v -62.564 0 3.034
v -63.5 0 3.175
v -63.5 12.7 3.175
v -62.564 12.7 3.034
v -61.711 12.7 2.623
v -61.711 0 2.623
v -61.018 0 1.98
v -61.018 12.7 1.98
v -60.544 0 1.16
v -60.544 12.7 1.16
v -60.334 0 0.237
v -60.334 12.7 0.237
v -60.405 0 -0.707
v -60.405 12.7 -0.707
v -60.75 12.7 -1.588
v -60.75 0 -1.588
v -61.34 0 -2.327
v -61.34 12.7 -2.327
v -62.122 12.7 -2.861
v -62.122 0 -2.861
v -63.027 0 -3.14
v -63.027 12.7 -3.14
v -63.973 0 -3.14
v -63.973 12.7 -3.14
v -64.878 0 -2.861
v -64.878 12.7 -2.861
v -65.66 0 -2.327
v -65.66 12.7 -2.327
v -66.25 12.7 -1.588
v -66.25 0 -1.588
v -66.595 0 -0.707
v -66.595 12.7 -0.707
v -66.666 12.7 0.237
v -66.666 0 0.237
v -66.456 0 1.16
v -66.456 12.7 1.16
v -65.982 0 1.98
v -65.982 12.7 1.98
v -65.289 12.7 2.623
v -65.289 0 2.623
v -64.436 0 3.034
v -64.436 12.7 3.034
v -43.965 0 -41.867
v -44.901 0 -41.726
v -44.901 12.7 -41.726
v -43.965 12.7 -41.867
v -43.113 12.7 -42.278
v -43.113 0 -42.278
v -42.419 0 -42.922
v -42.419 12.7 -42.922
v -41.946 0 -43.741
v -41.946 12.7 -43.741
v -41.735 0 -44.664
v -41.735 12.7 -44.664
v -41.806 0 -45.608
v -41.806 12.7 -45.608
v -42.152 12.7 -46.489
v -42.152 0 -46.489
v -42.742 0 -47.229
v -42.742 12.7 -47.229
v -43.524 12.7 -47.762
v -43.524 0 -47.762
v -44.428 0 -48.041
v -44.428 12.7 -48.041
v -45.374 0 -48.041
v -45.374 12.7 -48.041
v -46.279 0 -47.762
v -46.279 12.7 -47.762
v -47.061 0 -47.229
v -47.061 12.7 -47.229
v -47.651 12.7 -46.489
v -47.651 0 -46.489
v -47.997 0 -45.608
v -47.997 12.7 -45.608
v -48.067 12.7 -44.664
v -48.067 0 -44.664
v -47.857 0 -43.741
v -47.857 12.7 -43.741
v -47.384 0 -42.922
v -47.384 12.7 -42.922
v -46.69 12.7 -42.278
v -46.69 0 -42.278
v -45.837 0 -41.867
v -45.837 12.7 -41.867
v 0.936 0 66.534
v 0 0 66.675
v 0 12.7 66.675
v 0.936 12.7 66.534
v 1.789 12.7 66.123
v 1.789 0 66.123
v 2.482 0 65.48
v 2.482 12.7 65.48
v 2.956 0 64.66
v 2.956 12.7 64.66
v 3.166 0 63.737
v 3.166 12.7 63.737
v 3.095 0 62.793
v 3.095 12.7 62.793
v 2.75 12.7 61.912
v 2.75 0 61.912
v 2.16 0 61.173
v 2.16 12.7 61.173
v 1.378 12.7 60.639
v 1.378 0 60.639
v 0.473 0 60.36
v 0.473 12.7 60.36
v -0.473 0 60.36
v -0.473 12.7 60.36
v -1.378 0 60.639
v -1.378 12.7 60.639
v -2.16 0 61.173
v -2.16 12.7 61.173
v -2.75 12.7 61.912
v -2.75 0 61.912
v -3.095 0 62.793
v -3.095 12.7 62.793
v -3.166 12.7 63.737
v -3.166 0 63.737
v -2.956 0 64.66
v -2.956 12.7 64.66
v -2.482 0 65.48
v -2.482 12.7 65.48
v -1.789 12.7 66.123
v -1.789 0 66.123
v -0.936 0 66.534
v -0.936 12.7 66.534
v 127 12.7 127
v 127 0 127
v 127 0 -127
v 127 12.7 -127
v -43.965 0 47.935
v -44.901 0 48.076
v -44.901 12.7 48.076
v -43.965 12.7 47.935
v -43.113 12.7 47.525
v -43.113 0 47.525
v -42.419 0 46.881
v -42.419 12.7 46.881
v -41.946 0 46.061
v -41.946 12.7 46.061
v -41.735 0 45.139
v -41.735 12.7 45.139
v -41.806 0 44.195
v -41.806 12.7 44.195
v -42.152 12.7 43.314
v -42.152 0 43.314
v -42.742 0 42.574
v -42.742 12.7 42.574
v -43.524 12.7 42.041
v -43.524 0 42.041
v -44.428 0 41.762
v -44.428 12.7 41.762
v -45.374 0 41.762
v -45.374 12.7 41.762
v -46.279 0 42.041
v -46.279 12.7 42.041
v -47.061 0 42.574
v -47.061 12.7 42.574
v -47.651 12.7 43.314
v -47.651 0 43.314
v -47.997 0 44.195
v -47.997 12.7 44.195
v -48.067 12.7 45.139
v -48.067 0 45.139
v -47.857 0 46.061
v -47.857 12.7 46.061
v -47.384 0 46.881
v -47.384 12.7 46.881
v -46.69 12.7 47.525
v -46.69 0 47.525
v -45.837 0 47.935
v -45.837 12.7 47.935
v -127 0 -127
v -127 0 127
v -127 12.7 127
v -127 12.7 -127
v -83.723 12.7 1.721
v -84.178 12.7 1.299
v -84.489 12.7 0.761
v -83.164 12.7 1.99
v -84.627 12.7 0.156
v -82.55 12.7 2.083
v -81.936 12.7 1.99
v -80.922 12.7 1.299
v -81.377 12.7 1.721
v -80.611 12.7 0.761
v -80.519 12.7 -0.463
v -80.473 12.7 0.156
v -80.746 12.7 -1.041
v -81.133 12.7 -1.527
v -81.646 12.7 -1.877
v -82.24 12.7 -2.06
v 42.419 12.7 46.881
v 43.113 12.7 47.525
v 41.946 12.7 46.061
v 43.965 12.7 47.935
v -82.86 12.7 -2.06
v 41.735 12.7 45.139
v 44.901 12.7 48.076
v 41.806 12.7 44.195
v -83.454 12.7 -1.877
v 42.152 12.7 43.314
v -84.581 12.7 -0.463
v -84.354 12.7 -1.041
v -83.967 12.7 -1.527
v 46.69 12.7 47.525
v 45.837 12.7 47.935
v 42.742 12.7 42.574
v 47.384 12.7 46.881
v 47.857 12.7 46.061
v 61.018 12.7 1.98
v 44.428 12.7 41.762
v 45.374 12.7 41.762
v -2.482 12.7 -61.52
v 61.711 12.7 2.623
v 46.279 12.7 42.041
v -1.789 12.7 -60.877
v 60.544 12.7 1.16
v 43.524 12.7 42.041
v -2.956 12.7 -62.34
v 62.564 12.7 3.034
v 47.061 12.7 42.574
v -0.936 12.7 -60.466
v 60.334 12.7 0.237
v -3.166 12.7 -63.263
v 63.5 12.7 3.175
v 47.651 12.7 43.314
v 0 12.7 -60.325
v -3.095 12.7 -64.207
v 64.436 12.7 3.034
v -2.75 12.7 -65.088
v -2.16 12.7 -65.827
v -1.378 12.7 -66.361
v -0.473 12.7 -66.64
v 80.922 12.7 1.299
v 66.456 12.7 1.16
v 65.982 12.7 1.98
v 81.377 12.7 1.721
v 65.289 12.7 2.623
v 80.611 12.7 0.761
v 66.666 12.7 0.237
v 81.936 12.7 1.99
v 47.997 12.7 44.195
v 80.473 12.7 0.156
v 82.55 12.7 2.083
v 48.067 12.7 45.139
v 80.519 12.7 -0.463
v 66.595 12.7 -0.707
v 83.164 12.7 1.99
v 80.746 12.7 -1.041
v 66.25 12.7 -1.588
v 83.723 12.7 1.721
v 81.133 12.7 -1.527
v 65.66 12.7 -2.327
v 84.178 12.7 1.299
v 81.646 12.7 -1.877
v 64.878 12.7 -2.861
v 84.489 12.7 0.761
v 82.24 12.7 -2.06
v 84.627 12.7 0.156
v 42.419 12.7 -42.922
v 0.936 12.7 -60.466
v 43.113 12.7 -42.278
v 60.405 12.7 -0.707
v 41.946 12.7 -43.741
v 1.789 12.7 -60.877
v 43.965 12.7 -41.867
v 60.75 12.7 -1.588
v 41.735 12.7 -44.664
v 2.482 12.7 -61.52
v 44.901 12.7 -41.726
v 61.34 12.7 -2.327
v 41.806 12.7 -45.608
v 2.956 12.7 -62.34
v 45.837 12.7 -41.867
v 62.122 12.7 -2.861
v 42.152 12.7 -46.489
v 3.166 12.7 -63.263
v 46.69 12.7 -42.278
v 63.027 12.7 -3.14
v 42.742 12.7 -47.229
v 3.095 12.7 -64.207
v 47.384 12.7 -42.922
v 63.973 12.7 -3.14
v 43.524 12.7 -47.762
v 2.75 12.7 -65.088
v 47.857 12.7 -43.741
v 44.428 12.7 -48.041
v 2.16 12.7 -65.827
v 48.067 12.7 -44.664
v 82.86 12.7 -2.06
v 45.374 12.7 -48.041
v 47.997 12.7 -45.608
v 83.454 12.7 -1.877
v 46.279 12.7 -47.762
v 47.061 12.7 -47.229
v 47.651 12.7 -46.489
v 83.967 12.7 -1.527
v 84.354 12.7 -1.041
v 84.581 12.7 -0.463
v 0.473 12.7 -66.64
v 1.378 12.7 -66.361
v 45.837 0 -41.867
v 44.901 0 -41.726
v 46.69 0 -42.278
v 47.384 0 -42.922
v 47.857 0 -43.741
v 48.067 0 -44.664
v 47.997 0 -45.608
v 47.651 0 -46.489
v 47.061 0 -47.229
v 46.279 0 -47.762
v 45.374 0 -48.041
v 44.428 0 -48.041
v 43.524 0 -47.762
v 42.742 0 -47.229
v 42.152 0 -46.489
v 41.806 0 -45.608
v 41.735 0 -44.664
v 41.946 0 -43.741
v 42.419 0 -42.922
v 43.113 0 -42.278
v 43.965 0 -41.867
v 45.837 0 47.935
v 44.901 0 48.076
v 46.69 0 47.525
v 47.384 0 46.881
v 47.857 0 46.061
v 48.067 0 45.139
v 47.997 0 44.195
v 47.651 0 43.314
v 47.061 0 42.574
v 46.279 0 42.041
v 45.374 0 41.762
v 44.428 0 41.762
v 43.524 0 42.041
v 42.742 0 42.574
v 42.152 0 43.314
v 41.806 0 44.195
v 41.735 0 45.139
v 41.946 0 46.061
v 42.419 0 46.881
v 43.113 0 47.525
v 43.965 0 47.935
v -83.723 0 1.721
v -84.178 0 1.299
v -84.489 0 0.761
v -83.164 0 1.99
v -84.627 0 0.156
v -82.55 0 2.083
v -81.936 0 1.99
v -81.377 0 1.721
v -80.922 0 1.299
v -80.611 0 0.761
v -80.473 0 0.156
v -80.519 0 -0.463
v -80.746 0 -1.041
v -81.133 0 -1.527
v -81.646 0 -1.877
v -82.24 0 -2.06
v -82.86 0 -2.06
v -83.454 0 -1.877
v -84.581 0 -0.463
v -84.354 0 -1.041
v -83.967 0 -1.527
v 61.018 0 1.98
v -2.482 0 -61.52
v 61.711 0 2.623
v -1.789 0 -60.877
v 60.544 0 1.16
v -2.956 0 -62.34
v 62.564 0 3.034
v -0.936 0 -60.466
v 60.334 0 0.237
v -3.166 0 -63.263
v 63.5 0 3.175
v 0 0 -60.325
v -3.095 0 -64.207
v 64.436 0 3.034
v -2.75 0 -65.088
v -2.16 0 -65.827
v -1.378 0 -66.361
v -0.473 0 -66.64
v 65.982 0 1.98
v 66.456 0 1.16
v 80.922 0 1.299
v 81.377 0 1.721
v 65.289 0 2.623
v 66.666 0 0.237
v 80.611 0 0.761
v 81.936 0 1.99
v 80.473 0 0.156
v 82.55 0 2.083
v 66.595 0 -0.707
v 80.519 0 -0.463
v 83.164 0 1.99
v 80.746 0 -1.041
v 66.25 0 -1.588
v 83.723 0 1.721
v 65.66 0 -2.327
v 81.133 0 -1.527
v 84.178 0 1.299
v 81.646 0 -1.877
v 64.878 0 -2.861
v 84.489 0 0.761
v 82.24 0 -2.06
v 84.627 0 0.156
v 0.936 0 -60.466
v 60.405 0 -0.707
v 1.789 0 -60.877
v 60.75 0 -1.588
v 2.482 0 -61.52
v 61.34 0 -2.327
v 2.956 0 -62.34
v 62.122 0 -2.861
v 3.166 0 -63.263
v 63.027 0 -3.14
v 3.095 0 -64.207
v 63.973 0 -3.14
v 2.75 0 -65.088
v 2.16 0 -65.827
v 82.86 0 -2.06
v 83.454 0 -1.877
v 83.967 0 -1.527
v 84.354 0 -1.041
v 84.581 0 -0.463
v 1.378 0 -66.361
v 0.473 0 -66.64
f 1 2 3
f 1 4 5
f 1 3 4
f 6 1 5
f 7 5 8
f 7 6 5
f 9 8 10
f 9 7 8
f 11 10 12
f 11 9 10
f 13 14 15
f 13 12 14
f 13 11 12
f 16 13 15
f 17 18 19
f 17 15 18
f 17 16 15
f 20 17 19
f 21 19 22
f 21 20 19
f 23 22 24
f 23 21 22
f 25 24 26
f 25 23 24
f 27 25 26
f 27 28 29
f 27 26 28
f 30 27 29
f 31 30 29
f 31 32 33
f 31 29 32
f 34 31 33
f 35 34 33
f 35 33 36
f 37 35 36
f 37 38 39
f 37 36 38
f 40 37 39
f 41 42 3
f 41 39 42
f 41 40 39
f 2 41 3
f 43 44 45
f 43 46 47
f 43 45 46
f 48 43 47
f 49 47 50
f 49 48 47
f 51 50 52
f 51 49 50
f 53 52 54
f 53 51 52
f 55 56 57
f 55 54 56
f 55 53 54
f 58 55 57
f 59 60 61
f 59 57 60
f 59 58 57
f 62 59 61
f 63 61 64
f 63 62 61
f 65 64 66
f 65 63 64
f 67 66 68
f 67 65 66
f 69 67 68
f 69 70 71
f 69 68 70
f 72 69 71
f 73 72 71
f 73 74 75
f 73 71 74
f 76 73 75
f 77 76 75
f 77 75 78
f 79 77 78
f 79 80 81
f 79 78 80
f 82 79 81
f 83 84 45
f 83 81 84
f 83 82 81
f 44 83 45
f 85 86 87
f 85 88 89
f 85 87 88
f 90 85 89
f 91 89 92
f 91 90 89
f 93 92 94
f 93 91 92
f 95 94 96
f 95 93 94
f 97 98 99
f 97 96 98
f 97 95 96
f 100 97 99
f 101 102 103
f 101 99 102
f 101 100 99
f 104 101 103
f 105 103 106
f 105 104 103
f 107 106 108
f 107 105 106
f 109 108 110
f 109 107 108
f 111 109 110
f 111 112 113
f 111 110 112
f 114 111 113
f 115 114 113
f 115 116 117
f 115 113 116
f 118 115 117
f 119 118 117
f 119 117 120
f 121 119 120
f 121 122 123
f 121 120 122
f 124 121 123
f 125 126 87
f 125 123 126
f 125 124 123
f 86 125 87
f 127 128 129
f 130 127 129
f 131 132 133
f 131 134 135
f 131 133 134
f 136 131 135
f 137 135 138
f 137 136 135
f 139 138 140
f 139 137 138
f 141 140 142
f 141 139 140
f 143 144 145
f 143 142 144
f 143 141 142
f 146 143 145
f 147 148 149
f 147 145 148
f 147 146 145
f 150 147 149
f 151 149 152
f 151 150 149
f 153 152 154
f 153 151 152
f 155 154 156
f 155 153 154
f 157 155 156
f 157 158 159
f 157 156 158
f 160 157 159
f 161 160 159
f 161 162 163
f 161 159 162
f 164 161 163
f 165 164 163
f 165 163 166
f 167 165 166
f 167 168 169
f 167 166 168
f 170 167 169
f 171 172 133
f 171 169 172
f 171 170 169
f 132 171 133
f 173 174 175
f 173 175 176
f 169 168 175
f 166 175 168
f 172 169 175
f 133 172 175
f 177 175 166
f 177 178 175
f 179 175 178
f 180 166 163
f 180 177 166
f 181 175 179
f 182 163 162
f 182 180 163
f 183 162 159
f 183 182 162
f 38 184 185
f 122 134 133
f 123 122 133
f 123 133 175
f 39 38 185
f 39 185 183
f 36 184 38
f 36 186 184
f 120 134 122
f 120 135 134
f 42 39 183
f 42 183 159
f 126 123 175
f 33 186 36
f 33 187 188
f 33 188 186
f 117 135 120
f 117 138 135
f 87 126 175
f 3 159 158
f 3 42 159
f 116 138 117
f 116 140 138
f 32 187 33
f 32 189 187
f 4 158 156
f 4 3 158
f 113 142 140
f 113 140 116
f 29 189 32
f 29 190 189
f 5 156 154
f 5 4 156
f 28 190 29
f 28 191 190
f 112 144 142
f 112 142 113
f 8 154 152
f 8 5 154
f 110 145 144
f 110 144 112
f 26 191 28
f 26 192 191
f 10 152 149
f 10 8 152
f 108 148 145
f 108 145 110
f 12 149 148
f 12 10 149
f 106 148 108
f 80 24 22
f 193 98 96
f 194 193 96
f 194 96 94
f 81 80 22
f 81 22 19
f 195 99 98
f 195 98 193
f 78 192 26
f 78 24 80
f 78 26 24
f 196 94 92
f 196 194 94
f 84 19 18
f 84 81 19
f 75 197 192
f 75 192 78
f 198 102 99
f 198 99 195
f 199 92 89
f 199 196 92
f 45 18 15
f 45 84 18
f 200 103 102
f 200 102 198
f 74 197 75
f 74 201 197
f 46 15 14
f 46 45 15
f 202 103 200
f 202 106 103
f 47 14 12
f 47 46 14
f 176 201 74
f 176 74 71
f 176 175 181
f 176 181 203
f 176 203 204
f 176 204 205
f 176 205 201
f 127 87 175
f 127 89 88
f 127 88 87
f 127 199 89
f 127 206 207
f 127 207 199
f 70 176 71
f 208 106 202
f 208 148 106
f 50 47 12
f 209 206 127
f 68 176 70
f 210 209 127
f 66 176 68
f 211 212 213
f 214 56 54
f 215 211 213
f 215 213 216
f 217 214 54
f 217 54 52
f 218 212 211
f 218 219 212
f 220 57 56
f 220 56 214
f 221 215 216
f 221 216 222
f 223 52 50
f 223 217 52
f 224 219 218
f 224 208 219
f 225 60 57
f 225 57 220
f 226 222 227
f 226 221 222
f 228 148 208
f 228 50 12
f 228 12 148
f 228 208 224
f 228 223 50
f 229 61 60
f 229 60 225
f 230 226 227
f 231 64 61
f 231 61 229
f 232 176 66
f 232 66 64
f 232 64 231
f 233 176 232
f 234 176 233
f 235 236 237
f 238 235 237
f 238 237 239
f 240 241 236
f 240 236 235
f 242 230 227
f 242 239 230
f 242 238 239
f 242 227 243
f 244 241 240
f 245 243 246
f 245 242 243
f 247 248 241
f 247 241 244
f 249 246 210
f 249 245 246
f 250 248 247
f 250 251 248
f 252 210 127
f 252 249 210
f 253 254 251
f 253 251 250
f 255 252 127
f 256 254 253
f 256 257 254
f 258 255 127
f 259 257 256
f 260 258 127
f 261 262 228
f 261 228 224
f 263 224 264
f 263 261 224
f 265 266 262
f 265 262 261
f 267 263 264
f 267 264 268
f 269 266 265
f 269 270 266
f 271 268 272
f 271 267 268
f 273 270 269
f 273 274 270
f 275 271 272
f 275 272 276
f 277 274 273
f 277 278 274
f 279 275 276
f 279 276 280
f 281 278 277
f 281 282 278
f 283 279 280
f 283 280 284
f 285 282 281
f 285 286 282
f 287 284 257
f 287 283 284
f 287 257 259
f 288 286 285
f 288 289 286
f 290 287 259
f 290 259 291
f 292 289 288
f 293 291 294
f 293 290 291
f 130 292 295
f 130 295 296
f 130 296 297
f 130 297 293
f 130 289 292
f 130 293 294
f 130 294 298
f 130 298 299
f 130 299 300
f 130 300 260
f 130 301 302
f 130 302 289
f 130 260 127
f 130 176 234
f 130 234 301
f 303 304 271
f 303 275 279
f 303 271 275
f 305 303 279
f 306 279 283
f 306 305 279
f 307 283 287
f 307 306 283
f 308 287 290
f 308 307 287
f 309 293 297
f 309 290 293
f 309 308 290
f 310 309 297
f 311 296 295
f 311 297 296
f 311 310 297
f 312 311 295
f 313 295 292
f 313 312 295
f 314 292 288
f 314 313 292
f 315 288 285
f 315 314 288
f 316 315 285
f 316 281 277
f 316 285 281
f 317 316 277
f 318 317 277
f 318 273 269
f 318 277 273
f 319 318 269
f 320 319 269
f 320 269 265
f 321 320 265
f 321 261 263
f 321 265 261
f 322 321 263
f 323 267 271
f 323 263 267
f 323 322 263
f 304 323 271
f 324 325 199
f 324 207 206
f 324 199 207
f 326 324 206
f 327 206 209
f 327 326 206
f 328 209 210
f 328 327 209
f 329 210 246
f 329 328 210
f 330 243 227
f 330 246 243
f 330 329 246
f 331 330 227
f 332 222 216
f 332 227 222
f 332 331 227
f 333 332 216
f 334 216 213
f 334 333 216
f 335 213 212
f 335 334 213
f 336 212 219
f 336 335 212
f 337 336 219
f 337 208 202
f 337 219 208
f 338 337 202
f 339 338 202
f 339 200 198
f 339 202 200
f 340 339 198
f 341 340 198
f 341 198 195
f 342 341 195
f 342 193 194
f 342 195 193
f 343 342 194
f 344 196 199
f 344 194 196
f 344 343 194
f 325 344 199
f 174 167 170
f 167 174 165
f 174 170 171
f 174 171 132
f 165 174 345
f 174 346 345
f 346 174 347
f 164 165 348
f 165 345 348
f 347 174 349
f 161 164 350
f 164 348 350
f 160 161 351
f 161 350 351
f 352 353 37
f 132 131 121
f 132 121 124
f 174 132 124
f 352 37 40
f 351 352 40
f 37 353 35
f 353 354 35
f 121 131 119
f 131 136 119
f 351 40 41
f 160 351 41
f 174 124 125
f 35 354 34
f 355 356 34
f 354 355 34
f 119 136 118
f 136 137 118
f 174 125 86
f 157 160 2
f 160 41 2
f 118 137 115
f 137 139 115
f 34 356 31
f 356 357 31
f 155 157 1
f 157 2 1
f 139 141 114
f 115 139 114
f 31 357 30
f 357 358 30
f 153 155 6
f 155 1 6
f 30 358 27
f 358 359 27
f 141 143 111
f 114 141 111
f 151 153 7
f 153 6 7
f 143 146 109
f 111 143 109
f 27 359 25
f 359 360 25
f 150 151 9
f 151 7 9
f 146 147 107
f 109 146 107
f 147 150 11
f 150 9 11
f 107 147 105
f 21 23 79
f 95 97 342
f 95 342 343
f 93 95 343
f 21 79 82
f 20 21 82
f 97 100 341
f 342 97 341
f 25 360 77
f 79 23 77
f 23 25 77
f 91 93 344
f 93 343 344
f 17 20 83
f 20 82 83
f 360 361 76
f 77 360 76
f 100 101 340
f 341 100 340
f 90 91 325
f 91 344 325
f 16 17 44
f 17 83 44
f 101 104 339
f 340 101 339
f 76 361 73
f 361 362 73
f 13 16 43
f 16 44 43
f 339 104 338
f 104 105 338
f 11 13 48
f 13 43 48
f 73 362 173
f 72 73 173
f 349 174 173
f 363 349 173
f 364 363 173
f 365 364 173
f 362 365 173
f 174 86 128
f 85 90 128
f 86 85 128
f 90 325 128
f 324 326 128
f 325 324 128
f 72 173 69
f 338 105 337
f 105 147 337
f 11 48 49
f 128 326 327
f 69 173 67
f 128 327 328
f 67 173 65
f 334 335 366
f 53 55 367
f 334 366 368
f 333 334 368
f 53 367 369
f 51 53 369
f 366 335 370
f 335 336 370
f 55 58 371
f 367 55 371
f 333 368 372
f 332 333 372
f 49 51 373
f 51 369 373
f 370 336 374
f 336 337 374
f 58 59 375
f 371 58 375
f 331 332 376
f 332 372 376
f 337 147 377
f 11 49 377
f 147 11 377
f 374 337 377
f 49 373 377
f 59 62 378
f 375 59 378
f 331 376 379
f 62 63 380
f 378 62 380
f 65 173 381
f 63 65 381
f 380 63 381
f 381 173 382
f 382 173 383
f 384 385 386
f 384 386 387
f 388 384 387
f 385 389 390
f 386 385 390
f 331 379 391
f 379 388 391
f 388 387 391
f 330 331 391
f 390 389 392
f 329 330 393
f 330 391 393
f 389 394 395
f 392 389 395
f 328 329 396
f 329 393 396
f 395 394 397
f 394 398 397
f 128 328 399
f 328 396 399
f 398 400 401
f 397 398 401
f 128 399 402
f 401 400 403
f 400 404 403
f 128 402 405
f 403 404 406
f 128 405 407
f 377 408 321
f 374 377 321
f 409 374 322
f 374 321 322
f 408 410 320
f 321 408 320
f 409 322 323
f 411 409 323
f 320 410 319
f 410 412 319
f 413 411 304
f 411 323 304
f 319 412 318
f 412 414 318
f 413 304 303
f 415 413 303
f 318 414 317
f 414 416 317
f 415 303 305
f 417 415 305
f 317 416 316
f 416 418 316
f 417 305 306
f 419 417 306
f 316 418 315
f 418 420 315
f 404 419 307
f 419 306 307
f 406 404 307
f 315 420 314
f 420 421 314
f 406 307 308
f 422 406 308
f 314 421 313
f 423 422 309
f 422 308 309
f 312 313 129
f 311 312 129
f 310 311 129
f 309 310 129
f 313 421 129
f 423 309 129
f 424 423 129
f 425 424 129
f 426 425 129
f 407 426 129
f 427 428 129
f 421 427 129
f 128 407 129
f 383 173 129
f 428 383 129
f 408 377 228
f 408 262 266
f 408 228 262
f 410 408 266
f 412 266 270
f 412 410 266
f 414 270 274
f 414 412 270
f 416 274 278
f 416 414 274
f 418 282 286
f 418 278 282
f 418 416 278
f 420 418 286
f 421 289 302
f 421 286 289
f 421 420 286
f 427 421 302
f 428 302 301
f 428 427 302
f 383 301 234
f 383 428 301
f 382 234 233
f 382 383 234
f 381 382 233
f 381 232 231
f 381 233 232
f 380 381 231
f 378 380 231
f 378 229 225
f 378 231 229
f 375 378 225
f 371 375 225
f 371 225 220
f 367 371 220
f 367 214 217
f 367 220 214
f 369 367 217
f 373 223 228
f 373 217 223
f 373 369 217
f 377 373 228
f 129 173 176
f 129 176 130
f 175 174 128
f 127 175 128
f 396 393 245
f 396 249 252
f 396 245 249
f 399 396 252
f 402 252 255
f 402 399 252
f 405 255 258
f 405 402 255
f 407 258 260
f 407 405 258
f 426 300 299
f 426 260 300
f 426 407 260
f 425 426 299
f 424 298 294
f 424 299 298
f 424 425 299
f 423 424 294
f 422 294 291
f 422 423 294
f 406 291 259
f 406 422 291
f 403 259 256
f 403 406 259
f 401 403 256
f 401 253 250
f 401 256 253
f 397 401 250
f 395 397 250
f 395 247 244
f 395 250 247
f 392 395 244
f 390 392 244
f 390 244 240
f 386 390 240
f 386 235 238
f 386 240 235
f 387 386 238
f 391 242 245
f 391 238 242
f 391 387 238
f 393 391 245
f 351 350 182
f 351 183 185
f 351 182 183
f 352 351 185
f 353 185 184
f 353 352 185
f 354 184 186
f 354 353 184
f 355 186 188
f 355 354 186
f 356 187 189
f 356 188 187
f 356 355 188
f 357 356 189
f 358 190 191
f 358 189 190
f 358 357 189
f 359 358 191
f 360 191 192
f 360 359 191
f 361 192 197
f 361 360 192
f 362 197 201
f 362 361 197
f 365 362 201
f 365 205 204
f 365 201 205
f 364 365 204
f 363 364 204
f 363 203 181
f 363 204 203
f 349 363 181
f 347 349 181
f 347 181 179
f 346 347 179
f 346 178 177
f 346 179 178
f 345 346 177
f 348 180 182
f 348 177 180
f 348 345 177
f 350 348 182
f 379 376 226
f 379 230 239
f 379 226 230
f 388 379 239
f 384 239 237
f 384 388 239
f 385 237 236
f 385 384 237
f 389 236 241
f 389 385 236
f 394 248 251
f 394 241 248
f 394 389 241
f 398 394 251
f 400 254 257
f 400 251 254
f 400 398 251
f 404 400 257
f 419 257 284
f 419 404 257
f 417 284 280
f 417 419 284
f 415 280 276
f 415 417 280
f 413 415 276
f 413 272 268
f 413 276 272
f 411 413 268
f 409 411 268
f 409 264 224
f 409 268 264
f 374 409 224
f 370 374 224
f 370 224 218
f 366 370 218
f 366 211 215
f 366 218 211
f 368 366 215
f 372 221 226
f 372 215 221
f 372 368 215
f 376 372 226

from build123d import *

# Parameters (mm, degrees)
SKETCH1_W               = 254
SKETCH1_H               = 254
BOSS_EXTRUDE1_DEPTH     = 12.7
CUT_EXTRUDE2_DEPTH      = 181.05357536
CUT_EXTRUDE2_DEPTH_BACK = 181.05357536
SKETCH6_R               = 3.175
CUT_EXTRUDE3_DEPTH      = 181.05357536
CUT_EXTRUDE3_DEPTH_BACK = 181.05357536
SKETCH7_R               = 2.0828


with BuildPart() as part:
    # Sketch1 → Boss-Extrude1 (new body)
    with BuildSketch(Plane(origin=(0, 0, 0), x_dir=(1, 0, 0), z_dir=(0, 1, 0))):
        Rectangle(SKETCH1_W, SKETCH1_H)
    extrude(amount=BOSS_EXTRUDE1_DEPTH)

    # Sketch6 → Cut-Extrude2 (cut, two sides: drawn at the far end of the back side and taken through both)
    with BuildSketch(Plane(origin=(0, 12.7, 0), x_dir=(1, 0, 0), z_dir=(0, 1, 0)).offset(-CUT_EXTRUDE2_DEPTH_BACK)):
        with Locations(Location((0, 63.5, 0), (0, 0, 270))):
            Circle(SKETCH6_R)
        with Locations(Location((44.901280605, 44.901280605, 0), (0, 0, 270))):
            Circle(SKETCH6_R)
        with Locations(Location((63.5, 0, 0), (0, 0, 270))):
            Circle(SKETCH6_R)
        with Locations(Location((44.901280605, -44.901280605, 0), (0, 0, 270))):
            Circle(SKETCH6_R)
        with Locations(Location((0, -63.5, 0), (0, 0, 270))):
            Circle(SKETCH6_R)
        with Locations(Location((-44.901280605, -44.901280605, 0), (0, 0, 270))):
            Circle(SKETCH6_R)
        with Locations(Location((-63.5, 0, 0), (0, 0, 270))):
            Circle(SKETCH6_R)
        with Locations(Location((-44.901280605, 44.901280605, 0), (0, 0, 270))):
            Circle(SKETCH6_R)
    extrude(amount=CUT_EXTRUDE2_DEPTH + CUT_EXTRUDE2_DEPTH_BACK, mode=Mode.SUBTRACT)

    # Sketch7 → Cut-Extrude3 (cut, two sides: drawn at the far end of the back side and taken through both)
    with BuildSketch(Plane(origin=(0, 12.7, 0), x_dir=(1, 0, 0), z_dir=(0, 1, 0)).offset(-CUT_EXTRUDE3_DEPTH_BACK)):
        with Locations(Location((-82.55, 0, 0), (0, 0, 270))):
            Circle(SKETCH7_R)
        with Locations(Location((82.55, 0, 0), (0, 0, 270))):
            Circle(SKETCH7_R)
    extrude(amount=CUT_EXTRUDE3_DEPTH + CUT_EXTRUDE3_DEPTH_BACK, mode=Mode.SUBTRACT)


solid = part.part
